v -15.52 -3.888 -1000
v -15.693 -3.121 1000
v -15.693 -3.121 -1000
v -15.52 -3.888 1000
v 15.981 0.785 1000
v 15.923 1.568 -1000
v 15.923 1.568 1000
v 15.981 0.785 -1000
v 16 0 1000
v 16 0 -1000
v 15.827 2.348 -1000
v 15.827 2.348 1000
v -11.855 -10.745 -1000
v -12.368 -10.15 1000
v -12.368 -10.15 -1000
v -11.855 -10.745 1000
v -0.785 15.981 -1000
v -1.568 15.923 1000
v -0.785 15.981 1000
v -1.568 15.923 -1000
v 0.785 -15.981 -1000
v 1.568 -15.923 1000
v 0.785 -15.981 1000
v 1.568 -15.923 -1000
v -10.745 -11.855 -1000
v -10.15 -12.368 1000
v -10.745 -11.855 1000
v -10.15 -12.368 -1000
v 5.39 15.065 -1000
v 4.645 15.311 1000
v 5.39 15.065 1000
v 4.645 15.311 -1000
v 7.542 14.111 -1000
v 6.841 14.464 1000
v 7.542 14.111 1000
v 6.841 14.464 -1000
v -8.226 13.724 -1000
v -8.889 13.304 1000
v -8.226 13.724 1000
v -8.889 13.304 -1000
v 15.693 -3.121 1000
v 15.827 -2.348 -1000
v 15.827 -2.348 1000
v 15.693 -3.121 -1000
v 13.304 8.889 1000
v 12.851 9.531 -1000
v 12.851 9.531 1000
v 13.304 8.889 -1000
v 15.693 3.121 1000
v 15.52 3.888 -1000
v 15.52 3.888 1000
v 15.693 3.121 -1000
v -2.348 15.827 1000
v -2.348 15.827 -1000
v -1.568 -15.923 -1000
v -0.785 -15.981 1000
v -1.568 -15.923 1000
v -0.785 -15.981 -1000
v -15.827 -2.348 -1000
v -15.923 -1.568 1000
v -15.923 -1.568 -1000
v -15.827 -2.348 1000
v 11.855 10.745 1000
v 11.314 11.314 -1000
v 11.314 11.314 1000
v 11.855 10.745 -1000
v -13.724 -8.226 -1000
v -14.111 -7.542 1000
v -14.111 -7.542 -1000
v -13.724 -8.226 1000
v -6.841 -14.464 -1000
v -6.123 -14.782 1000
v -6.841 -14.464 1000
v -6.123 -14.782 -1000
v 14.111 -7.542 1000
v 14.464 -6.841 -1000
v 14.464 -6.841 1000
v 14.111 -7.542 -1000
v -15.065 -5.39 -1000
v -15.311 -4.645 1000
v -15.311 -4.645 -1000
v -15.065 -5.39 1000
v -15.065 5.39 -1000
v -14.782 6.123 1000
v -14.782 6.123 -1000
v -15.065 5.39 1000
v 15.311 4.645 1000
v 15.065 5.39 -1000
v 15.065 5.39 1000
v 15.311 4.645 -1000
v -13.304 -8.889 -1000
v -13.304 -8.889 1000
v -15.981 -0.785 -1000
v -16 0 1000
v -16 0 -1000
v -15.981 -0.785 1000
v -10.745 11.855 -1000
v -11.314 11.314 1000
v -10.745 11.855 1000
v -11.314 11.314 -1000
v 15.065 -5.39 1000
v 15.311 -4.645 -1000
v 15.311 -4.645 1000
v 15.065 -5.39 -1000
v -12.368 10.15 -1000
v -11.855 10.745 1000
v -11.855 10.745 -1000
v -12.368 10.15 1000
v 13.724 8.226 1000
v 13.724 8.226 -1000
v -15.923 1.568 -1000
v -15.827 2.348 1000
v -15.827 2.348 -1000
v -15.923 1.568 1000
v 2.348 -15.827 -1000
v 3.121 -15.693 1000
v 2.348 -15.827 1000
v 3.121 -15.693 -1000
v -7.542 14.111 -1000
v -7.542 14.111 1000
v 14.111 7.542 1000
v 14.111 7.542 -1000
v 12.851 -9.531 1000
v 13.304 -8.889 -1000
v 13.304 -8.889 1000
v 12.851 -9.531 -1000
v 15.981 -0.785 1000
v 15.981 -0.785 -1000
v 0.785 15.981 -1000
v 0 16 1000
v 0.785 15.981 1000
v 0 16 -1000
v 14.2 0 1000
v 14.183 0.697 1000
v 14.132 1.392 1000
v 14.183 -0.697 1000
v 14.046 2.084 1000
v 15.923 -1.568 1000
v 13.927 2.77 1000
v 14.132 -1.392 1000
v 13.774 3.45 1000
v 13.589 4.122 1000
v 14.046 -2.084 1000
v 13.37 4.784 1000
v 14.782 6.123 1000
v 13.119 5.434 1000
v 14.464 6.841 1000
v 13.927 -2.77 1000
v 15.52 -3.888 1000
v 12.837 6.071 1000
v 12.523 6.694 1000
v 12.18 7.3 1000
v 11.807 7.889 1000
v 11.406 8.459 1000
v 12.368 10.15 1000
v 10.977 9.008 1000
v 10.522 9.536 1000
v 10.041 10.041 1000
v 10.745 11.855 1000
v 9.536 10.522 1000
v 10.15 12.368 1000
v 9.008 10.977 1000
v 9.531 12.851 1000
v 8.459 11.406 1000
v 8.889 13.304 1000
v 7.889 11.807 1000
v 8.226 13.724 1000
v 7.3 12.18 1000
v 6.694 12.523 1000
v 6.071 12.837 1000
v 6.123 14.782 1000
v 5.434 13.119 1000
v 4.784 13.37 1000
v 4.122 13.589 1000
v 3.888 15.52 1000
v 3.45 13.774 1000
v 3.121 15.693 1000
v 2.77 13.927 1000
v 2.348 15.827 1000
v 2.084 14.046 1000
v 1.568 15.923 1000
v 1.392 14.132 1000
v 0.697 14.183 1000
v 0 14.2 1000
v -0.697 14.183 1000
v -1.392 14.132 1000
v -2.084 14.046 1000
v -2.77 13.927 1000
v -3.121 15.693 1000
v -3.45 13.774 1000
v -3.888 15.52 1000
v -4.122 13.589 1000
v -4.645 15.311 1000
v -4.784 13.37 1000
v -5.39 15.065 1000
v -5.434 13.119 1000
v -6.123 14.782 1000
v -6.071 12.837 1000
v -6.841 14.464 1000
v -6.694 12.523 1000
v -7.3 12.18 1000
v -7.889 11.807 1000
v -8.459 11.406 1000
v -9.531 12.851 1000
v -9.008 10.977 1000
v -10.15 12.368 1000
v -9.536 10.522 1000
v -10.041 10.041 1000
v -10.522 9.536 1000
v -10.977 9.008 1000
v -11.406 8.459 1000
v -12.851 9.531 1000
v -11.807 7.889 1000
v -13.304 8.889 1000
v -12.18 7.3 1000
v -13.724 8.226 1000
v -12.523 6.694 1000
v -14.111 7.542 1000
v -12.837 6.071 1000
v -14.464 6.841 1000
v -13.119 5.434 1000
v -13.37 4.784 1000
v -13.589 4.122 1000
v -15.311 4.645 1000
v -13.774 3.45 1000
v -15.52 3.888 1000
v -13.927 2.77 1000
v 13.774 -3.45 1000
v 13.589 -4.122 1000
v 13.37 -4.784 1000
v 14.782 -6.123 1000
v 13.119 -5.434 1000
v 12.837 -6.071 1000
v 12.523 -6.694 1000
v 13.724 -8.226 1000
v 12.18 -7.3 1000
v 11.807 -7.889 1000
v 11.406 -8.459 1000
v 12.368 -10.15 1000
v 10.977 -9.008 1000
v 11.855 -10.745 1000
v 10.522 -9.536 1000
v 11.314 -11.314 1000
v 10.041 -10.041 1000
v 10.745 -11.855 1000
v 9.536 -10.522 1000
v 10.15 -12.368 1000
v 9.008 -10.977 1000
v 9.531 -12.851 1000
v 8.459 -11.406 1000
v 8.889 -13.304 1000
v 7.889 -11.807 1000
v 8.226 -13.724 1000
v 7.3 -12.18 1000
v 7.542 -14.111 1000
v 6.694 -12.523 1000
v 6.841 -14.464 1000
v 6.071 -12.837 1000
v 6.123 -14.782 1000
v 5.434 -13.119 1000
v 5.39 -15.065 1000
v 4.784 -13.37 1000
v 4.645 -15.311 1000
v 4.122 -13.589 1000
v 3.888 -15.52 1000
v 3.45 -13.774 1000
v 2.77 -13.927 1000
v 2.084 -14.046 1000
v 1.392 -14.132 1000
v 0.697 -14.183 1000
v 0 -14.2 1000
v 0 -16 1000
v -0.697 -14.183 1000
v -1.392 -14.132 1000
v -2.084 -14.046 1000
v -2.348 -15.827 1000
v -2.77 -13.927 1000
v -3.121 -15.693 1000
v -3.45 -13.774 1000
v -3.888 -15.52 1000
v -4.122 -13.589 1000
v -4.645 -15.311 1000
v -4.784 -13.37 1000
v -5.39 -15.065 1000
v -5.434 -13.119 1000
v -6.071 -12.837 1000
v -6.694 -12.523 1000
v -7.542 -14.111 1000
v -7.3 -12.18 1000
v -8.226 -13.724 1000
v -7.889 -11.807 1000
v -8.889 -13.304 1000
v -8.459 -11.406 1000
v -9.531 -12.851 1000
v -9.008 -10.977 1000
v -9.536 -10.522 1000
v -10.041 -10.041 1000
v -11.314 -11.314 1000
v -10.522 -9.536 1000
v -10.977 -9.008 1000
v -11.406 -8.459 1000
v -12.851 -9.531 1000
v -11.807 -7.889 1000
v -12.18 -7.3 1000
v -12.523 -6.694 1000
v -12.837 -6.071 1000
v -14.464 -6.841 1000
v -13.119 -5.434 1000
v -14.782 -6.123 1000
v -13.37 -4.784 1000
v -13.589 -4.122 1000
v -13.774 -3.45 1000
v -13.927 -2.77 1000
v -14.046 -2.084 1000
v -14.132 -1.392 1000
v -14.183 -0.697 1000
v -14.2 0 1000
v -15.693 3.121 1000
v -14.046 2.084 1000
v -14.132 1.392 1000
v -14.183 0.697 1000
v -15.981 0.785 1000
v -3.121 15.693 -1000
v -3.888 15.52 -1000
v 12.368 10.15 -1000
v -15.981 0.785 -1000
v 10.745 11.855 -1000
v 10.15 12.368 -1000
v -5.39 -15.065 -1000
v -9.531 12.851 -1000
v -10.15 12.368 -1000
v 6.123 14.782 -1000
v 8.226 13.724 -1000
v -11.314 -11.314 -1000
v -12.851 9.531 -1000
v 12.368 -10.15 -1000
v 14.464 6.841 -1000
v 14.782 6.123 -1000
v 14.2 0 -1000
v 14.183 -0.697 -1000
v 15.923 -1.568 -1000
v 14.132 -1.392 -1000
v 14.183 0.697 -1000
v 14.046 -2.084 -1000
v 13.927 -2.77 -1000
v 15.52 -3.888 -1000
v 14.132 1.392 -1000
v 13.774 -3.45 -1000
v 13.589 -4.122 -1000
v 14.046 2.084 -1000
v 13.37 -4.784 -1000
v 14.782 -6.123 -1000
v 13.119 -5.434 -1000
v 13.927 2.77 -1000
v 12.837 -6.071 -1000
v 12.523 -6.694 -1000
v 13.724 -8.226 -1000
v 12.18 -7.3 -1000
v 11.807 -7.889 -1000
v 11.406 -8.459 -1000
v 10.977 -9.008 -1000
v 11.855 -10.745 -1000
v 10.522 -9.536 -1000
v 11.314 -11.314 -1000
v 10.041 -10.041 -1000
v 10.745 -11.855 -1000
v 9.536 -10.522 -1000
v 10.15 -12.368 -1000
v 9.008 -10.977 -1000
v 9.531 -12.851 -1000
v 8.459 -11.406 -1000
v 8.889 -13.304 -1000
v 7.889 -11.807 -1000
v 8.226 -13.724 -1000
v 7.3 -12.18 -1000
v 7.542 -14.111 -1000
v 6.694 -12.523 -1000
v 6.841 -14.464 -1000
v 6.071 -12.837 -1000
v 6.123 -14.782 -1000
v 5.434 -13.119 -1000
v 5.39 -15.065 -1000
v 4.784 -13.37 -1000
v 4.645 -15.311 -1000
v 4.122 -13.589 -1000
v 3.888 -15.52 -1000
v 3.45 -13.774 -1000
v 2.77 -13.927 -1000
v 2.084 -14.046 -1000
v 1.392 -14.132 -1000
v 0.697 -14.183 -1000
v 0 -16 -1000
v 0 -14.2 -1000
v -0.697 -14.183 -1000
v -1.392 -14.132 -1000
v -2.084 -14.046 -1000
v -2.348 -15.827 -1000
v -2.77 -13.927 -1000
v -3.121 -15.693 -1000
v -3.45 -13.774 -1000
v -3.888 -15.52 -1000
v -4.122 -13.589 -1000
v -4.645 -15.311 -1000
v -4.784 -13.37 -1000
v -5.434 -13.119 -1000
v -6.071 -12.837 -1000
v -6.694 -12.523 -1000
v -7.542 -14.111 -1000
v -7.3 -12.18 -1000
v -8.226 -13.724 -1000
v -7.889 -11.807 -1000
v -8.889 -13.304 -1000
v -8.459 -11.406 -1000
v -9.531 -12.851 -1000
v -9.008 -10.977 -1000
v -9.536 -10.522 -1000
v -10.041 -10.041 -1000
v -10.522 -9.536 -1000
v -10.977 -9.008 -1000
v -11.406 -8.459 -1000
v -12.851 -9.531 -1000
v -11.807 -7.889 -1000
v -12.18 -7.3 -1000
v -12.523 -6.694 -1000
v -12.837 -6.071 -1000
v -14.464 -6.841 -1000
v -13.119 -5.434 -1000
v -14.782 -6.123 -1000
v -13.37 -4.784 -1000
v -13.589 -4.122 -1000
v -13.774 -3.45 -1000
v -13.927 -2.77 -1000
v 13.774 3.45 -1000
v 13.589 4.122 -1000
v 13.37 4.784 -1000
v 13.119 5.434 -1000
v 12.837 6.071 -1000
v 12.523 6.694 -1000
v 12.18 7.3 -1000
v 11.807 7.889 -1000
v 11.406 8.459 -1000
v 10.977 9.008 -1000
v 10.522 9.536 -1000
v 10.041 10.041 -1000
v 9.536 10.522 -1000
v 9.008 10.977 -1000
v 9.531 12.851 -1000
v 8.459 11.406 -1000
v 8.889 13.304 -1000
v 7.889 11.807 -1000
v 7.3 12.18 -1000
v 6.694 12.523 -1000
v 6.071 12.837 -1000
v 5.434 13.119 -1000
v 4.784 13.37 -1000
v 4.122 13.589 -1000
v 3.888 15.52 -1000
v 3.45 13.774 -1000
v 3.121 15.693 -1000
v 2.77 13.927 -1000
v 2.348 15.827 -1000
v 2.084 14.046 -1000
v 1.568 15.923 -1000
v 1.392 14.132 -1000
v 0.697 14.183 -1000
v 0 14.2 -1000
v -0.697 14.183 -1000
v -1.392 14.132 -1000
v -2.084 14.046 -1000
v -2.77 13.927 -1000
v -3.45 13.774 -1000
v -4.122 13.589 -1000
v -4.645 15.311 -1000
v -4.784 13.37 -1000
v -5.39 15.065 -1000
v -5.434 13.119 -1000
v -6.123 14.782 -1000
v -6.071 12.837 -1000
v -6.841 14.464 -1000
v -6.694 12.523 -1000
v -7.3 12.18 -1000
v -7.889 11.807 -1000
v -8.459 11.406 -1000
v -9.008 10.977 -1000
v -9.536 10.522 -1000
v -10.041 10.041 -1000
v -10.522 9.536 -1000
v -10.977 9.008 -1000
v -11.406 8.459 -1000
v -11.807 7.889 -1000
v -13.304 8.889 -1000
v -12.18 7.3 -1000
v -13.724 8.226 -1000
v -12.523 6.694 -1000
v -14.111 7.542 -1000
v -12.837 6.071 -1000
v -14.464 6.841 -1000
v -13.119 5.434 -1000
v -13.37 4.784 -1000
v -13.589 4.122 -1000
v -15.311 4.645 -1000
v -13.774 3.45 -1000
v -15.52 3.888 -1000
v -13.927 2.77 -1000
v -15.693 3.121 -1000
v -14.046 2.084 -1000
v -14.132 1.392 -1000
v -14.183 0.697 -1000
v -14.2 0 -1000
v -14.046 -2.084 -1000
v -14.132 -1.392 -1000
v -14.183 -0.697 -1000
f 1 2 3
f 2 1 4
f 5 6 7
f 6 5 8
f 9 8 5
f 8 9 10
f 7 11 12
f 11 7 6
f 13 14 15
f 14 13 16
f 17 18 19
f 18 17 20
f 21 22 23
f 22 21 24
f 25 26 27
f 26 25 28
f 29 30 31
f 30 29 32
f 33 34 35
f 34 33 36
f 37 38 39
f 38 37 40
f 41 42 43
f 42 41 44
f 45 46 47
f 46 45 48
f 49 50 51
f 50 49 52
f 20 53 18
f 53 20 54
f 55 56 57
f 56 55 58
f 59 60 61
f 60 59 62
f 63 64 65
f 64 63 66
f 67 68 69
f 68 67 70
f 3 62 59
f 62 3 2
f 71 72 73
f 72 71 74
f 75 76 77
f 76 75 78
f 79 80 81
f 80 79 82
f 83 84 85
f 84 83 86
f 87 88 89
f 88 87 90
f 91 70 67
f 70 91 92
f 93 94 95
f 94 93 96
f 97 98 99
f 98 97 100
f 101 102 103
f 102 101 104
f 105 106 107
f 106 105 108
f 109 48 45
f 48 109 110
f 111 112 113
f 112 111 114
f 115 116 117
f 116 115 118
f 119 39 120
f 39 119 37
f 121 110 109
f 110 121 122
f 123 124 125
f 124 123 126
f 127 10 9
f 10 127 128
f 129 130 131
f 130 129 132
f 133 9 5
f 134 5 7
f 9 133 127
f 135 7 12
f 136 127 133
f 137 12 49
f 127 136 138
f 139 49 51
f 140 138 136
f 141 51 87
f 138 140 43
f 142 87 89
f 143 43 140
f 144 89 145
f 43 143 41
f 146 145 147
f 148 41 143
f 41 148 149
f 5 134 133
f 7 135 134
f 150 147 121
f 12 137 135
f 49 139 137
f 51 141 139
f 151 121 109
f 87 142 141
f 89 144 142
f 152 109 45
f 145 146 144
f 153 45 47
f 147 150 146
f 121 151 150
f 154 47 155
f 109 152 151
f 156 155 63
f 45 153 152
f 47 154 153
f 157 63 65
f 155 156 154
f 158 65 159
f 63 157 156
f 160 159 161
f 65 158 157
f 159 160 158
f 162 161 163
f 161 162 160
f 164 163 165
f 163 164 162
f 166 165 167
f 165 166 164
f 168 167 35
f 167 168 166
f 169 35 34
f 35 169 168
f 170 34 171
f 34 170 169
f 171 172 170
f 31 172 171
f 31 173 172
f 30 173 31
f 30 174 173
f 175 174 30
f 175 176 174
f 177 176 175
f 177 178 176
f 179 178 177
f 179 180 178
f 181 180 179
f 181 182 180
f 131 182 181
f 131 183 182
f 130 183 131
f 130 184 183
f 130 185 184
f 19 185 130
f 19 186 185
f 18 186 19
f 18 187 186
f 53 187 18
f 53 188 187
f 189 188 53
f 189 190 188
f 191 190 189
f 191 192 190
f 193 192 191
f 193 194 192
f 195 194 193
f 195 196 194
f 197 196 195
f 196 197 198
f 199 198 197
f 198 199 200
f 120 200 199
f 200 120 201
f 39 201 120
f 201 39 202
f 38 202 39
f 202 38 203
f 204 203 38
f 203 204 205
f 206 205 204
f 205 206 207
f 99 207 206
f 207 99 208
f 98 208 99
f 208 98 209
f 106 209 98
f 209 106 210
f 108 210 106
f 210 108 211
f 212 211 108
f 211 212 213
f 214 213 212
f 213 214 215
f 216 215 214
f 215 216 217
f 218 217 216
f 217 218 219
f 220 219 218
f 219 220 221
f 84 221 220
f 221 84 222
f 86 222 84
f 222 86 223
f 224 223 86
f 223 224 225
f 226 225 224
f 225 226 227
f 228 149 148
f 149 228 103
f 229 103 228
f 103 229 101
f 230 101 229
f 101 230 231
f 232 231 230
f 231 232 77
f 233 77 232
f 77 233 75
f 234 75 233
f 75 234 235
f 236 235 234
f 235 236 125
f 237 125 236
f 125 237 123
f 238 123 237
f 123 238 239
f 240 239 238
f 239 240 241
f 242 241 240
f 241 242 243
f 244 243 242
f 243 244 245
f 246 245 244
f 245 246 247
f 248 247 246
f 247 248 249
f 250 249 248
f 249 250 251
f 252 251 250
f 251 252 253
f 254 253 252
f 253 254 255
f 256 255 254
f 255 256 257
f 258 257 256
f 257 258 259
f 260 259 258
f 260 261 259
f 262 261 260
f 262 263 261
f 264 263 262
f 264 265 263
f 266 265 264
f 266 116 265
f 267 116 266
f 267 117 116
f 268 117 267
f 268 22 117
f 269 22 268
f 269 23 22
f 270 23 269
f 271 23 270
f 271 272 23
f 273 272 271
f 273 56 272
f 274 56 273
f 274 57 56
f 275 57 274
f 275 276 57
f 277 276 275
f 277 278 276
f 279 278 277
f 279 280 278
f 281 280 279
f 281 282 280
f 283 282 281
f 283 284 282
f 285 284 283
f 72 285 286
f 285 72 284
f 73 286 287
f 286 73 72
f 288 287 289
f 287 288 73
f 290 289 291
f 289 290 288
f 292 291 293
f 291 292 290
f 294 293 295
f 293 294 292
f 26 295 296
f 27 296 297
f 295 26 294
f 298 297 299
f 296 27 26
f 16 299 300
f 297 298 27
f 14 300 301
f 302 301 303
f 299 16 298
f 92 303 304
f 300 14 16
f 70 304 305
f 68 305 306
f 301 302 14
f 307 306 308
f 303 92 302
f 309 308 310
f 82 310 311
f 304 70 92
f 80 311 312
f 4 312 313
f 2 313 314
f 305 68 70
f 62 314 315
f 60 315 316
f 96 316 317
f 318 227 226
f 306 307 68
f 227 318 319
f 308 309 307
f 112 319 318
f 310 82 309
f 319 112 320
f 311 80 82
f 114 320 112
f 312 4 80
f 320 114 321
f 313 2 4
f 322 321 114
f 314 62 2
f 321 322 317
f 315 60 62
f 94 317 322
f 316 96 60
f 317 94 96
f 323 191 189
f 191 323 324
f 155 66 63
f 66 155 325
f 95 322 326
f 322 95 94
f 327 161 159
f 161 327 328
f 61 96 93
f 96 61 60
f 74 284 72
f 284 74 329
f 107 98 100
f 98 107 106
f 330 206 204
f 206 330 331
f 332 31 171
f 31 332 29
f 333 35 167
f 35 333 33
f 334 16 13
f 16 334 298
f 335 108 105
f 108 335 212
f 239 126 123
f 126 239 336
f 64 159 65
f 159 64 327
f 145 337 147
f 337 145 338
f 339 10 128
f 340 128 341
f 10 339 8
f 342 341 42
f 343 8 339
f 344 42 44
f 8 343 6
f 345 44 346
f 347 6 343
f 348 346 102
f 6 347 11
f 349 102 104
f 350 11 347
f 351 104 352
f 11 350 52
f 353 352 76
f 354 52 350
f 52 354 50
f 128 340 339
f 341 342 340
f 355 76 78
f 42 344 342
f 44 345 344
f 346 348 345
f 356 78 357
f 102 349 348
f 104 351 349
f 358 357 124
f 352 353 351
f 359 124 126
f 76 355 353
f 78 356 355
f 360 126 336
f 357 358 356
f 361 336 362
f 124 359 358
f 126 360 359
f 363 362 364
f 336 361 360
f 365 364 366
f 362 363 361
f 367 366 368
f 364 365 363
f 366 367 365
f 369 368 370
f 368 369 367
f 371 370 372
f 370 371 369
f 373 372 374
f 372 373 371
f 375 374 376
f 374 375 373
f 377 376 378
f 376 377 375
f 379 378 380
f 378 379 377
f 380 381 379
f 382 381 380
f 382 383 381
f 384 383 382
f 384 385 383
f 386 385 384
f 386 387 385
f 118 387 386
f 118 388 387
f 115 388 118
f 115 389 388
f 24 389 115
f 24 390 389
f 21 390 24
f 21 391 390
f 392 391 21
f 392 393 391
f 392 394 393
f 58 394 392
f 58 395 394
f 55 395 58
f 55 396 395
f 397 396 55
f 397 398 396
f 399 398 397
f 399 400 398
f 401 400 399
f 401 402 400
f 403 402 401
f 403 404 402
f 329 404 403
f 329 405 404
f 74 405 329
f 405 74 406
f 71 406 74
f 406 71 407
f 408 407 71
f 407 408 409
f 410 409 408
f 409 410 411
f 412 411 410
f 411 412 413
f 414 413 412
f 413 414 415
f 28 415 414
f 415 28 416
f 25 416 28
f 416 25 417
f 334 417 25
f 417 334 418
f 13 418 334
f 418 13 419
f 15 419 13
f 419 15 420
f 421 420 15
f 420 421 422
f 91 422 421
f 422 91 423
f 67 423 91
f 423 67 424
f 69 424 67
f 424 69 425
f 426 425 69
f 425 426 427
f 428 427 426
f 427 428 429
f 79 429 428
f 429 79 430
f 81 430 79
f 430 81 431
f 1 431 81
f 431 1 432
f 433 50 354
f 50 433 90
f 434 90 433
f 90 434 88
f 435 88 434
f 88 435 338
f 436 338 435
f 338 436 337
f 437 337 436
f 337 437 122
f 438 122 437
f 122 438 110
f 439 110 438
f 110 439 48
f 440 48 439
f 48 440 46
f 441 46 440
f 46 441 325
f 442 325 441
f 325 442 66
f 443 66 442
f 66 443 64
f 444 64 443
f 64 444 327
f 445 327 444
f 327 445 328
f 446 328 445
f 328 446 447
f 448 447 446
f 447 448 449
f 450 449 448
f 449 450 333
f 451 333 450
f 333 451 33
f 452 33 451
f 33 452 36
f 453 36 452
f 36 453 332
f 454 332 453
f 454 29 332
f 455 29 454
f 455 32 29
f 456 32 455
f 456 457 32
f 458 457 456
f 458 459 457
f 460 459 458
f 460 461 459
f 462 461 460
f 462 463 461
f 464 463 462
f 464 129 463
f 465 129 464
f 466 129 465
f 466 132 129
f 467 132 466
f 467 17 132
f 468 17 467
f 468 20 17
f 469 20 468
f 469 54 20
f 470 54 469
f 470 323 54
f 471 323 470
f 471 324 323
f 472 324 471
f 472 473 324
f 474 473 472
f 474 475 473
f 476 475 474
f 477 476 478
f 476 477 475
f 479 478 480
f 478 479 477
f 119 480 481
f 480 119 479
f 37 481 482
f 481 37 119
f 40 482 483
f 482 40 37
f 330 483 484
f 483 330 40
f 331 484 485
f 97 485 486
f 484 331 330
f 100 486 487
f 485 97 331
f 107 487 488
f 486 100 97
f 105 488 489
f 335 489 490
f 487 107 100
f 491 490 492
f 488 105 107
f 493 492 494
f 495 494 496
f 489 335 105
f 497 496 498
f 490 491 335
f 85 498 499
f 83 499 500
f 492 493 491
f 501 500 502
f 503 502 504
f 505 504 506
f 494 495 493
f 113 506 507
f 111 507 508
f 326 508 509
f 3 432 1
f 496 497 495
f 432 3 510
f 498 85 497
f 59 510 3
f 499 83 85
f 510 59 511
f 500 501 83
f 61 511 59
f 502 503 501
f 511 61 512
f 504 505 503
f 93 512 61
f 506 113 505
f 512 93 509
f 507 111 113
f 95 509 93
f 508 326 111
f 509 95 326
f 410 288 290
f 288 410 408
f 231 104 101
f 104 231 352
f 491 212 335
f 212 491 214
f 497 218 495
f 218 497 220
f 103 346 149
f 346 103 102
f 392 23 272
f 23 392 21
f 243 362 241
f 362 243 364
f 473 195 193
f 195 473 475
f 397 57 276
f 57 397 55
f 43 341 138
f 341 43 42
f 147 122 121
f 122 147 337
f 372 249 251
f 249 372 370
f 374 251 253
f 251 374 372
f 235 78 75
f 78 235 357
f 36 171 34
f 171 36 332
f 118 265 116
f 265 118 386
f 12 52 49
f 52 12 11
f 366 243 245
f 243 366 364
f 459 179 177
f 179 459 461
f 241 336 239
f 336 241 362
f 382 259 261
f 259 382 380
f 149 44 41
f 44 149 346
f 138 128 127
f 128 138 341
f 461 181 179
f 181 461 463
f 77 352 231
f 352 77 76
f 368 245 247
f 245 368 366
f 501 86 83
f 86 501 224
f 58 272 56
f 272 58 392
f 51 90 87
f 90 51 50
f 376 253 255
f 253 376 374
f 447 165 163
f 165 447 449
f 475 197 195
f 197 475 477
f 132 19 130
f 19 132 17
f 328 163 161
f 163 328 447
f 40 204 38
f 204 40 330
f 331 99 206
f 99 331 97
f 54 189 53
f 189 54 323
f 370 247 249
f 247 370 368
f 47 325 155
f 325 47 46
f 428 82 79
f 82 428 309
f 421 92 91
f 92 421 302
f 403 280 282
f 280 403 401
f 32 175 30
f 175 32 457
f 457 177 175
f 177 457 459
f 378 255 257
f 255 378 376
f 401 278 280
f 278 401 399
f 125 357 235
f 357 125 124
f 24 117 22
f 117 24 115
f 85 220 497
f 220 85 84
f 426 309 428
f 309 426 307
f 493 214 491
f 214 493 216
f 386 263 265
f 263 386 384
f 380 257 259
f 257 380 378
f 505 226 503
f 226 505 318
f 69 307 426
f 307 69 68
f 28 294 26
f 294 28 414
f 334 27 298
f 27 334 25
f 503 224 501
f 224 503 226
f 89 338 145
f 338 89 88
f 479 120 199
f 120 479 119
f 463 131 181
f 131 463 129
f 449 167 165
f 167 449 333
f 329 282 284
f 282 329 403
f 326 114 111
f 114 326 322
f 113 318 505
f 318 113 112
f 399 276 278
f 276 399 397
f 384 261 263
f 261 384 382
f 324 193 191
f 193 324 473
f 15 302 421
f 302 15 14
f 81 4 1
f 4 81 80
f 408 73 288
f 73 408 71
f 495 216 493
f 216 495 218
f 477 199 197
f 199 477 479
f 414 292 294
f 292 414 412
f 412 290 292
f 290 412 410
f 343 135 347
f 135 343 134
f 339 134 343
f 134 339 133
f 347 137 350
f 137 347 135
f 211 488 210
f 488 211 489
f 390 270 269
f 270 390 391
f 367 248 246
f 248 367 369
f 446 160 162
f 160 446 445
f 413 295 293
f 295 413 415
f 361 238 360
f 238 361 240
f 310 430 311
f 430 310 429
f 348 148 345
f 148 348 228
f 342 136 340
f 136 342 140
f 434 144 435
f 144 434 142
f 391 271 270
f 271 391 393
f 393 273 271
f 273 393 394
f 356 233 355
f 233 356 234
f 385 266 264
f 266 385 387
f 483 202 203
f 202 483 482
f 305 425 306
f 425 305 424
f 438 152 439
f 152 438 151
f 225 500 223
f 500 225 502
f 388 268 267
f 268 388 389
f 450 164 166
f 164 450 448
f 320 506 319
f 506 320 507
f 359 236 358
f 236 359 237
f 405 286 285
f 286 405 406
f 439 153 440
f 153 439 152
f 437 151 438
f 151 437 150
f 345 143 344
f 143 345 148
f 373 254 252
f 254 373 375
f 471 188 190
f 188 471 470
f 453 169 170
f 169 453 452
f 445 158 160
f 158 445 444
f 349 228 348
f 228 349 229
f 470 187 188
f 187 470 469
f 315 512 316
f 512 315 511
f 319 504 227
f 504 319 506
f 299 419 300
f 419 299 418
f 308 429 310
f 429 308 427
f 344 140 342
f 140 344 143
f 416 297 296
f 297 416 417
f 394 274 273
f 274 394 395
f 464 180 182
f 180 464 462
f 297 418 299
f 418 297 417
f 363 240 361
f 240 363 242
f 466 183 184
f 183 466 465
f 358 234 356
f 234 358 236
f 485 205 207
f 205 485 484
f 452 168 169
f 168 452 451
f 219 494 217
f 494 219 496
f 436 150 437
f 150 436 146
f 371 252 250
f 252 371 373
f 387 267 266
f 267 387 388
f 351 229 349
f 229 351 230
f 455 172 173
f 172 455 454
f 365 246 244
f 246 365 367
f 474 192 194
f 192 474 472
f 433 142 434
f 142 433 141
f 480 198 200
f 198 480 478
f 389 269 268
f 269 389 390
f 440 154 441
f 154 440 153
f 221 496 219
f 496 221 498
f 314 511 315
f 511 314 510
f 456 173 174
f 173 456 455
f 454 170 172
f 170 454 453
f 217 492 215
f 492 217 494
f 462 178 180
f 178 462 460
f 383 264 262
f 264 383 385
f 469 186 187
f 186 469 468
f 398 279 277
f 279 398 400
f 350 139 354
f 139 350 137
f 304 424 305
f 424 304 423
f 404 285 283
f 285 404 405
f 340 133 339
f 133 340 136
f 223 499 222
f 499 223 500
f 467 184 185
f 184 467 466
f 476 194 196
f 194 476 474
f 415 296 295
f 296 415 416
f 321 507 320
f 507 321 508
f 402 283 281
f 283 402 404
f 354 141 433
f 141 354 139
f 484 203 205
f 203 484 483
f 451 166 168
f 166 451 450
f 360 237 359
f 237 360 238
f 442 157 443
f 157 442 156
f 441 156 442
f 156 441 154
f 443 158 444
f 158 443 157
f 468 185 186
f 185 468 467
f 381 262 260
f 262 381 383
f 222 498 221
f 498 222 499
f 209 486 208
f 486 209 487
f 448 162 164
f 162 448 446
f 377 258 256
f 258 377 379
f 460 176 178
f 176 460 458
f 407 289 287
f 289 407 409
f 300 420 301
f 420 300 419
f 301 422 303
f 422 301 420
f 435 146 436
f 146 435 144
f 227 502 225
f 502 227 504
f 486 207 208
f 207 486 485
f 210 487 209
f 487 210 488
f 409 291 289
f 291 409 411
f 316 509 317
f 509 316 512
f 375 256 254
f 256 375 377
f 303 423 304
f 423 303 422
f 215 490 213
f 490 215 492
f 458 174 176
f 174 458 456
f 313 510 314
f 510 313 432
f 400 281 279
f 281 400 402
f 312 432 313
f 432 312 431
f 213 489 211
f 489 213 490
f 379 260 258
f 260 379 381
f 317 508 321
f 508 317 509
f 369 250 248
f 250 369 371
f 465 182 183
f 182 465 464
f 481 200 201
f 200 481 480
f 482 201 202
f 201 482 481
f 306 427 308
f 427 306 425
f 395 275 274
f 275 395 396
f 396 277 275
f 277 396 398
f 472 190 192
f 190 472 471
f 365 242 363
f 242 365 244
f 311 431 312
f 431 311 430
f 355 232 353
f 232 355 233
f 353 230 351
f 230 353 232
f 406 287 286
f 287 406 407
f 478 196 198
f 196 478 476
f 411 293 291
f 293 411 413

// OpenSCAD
$fn=128;

module ht_pipe(od=32, wall=1.8, length=2000) {
    difference() {
        cylinder(h=length, d=od, center=true);
        cylinder(h=length+2, d=od-2*wall, center=true);
    }
}

ht_pipe(od=32, wall=1.8, length=2000);
